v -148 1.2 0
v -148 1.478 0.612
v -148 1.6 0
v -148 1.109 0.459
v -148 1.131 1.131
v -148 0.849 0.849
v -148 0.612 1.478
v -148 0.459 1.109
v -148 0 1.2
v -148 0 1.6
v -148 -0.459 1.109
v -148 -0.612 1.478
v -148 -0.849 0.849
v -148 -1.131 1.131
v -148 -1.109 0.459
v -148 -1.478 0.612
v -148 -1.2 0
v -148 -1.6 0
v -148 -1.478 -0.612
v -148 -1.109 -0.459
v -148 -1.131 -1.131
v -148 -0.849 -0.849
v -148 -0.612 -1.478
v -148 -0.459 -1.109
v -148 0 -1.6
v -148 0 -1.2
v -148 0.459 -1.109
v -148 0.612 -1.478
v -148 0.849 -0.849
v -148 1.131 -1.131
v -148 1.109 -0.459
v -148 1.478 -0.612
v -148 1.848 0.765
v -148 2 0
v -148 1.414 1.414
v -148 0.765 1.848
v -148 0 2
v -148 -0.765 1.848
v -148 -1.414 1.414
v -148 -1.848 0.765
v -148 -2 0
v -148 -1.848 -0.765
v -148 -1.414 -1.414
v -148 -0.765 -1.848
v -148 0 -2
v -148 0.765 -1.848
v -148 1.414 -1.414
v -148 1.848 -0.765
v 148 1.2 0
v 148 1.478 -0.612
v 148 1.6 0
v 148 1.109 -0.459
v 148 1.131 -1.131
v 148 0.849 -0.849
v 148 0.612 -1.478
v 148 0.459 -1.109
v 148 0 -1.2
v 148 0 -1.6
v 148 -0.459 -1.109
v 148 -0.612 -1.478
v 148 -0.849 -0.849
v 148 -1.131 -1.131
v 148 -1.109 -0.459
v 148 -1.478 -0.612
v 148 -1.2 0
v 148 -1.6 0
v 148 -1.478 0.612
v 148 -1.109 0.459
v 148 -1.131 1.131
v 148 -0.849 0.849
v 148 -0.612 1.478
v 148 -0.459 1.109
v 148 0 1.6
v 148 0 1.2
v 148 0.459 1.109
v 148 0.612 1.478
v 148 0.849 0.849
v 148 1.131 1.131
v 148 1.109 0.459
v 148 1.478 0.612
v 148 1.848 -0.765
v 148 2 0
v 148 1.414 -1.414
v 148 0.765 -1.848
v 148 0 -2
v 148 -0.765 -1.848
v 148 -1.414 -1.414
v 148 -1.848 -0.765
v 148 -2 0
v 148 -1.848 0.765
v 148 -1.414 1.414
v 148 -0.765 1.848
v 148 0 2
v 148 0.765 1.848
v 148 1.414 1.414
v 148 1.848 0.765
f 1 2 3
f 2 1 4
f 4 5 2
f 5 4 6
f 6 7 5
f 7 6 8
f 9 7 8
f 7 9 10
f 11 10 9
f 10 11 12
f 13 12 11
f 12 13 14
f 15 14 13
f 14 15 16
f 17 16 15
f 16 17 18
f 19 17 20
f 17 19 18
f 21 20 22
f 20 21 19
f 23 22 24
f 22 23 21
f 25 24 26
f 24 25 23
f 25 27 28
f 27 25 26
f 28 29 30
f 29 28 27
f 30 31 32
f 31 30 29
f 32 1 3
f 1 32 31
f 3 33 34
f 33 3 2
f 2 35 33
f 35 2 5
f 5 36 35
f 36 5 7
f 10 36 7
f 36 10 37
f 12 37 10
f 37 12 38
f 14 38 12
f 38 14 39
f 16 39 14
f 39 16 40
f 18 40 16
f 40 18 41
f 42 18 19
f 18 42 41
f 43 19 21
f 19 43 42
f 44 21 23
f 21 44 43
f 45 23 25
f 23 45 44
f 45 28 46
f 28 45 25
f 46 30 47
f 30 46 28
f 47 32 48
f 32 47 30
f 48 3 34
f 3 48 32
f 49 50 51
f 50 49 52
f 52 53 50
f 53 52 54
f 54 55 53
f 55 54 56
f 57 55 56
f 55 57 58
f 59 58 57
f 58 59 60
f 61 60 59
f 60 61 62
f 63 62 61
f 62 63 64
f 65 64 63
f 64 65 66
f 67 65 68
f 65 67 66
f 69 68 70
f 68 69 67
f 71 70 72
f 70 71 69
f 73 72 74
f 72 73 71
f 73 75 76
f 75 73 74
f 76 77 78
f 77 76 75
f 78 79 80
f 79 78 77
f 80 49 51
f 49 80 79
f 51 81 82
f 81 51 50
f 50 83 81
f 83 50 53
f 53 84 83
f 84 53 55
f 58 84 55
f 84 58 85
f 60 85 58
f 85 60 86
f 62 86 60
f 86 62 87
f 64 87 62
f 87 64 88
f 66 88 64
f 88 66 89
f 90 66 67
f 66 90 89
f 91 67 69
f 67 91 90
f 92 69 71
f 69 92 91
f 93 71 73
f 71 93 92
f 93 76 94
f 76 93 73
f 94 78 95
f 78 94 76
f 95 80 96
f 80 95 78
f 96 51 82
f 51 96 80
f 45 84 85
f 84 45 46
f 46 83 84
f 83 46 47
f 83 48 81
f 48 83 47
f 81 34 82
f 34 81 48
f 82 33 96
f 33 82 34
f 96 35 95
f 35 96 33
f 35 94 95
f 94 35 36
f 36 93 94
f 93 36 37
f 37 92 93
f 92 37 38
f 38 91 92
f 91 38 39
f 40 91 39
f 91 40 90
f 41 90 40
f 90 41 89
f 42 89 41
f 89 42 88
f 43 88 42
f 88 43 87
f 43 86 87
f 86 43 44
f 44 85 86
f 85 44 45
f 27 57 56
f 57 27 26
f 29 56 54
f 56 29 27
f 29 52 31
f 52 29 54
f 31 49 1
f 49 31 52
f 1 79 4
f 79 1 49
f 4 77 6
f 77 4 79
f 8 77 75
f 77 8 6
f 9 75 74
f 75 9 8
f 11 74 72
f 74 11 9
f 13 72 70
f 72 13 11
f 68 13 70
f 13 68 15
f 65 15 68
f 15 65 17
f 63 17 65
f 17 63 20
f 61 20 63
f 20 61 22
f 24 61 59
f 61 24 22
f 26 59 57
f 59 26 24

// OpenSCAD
// file: ../p/4-4cyli.scad
use <../lib.scad>
function ldraw_lib__4_4cyli() = [
// 0 Cylinder 1.0
// 0 Name: 4-4cyli.dat
// 0 Author: James Jessiman
// 0 !LDRAW_ORG Primitive UPDATE 2005-01
// 0 !LICENSE Licensed under CC BY 4.0 : see CAreadme.txt
// 
// 0 BFC CERTIFY CCW
  [0,"BFC","CERTIFY"],
  [0,"BFC","CCW"],
// 
// 0 !HISTORY 1998-12-15 [PTadmin] Official Update 1998-10
// 0 !HISTORY 2002-03-23 [sbliss] Added BFC statement; merged headers from files in distributions LDraw 0.27 and Complete.
// 0 !HISTORY 2002-04-25 [PTadmin] Official Update 2002-02
// 0 !HISTORY 2004-12-14 [guyvivan] BFC CCW
// 0 !HISTORY 2005-12-28 [PTadmin] Official Update 2005-01
// 0 !HISTORY 2007-06-24 [PTadmin] Header formatted for Contributor Agreement
// 0 !HISTORY 2008-07-01 [PTadmin] Official Update 2008-01
// 
// 
// 4 16 1 1 0 0.9239 1 0.3827 0.9239 0 0.3827 1 0 0
  [4,16,1,1,0,0.9239,1,0.3827,0.9239,0,0.3827,1,0,0],
// 5 24 1 0 0 1 1 0 0.9239 0 0.3827 0.9239 0 -0.3827
  [5,24,1,0,0,1,1,0,0.9239,0,0.3827,0.9239,0,-0.3827],
// 4 16 0.9239 1 0.3827 0.7071 1 0.7071 0.7071 0 0.7071 0.9239 0 0.3827
  [4,16,0.9239,1,0.3827,0.7071,1,0.7071,0.7071,0,0.7071,0.9239,0,0.3827],
// 5 24 0.9239 0 0.3827 0.9239 1 0.3827 0.7071 0 0.7071 1 0 0
  [5,24,0.9239,0,0.3827,0.9239,1,0.3827,0.7071,0,0.7071,1,0,0],
// 4 16 0.7071 1 0.7071 0.3827 1 0.9239 0.3827 0 0.9239 0.7071 0 0.7071
  [4,16,0.7071,1,0.7071,0.3827,1,0.9239,0.3827,0,0.9239,0.7071,0,0.7071],
// 5 24 0.7071 0 0.7071 0.7071 1 0.7071 0.3827 0 0.9239 0.9239 0 0.3827
  [5,24,0.7071,0,0.7071,0.7071,1,0.7071,0.3827,0,0.9239,0.9239,0,0.3827],
// 4 16 0.3827 1 0.9239 0 1 1 0 0 1 0.3827 0 0.9239
  [4,16,0.3827,1,0.9239,0,1,1,0,0,1,0.3827,0,0.9239],
// 5 24 0.3827 0 0.9239 0.3827 1 0.9239 0 0 1 0.7071 0 0.7071
  [5,24,0.3827,0,0.9239,0.3827,1,0.9239,0,0,1,0.7071,0,0.7071],
// 4 16 0 1 1 -0.3827 1 0.9239 -0.3827 0 0.9239 0 0 1
  [4,16,0,1,1,-0.3827,1,0.9239,-0.3827,0,0.9239,0,0,1],
// 5 24 0 0 1 0 1 1 -0.3827 0 0.9239 0.3827 0 0.9239
  [5,24,0,0,1,0,1,1,-0.3827,0,0.9239,0.3827,0,0.9239],
// 4 16 -0.3827 1 0.9239 -0.7071 1 0.7071 -0.7071 0 0.7071 -0.3827 0 0.9239
  [4,16,-0.3827,1,0.9239,-0.7071,1,0.7071,-0.7071,0,0.7071,-0.3827,0,0.9239],
// 5 24 -0.3827 0 0.9239 -0.3827 1 0.9239 -0.7071 0 0.7071 0 0 1
  [5,24,-0.3827,0,0.9239,-0.3827,1,0.9239,-0.7071,0,0.7071,0,0,1],
// 4 16 -0.7071 1 0.7071 -0.9239 1 0.3827 -0.9239 0 0.3827 -0.7071 0 0.7071
  [4,16,-0.7071,1,0.7071,-0.9239,1,0.3827,-0.9239,0,0.3827,-0.7071,0,0.7071],
// 5 24 -0.7071 0 0.7071 -0.7071 1 0.7071 -0.9239 0 0.3827 -0.3827 0 0.9239
  [5,24,-0.7071,0,0.7071,-0.7071,1,0.7071,-0.9239,0,0.3827,-0.3827,0,0.9239],
// 4 16 -0.9239 1 0.3827 -1 1 0 -1 0 0 -0.9239 0 0.3827
  [4,16,-0.9239,1,0.3827,-1,1,0,-1,0,0,-0.9239,0,0.3827],
// 5 24 -0.9239 0 0.3827 -0.9239 1 0.3827 -1 0 0 -0.7071 0 0.7071
  [5,24,-0.9239,0,0.3827,-0.9239,1,0.3827,-1,0,0,-0.7071,0,0.7071],
// 4 16 -1 1 0 -0.9239 1 -0.3827 -0.9239 0 -0.3827 -1 0 0
  [4,16,-1,1,0,-0.9239,1,-0.3827,-0.9239,0,-0.3827,-1,0,0],
// 5 24 -1 0 0 -1 1 0 -0.9239 0 -0.3827 -0.9239 0 0.3827
  [5,24,-1,0,0,-1,1,0,-0.9239,0,-0.3827,-0.9239,0,0.3827],
// 4 16 -0.9239 1 -0.3827 -0.7071 1 -0.7071 -0.7071 0 -0.7071 -0.9239 0 -0.3827
  [4,16,-0.9239,1,-0.3827,-0.7071,1,-0.7071,-0.7071,0,-0.7071,-0.9239,0,-0.3827],
// 5 24 -0.9239 0 -0.3827 -0.9239 1 -0.3827 -0.7071 0 -0.7071 -1 0 0
  [5,24,-0.9239,0,-0.3827,-0.9239,1,-0.3827,-0.7071,0,-0.7071,-1,0,0],
// 4 16 -0.7071 1 -0.7071 -0.3827 1 -0.9239 -0.3827 0 -0.9239 -0.7071 0 -0.7071
  [4,16,-0.7071,1,-0.7071,-0.3827,1,-0.9239,-0.3827,0,-0.9239,-0.7071,0,-0.7071],
// 5 24 -0.7071 0 -0.7071 -0.7071 1 -0.7071 -0.3827 0 -0.9239 -0.9239 0 -0.3827
  [5,24,-0.7071,0,-0.7071,-0.7071,1,-0.7071,-0.3827,0,-0.9239,-0.9239,0,-0.3827],
// 4 16 -0.3827 1 -0.9239 0 1 -1 0 0 -1 -0.3827 0 -0.9239
  [4,16,-0.3827,1,-0.9239,0,1,-1,0,0,-1,-0.3827,0,-0.9239],
// 5 24 -0.3827 0 -0.9239 -0.3827 1 -0.9239 0 0 -1 -0.7071 0 -0.7071
  [5,24,-0.3827,0,-0.9239,-0.3827,1,-0.9239,0,0,-1,-0.7071,0,-0.7071],
// 4 16 0 1 -1 0.3827 1 -0.9239 0.3827 0 -0.9239 0 0 -1
  [4,16,0,1,-1,0.3827,1,-0.9239,0.3827,0,-0.9239,0,0,-1],
// 5 24 0 0 -1 0 1 -1 0.3827 0 -0.9239 -0.3827 0 -0.9239
  [5,24,0,0,-1,0,1,-1,0.3827,0,-0.9239,-0.3827,0,-0.9239],
// 4 16 0.3827 1 -0.9239 0.7071 1 -0.7071 0.7071 0 -0.7071 0.3827 0 -0.9239
  [4,16,0.3827,1,-0.9239,0.7071,1,-0.7071,0.7071,0,-0.7071,0.3827,0,-0.9239],
// 5 24 0.3827 0 -0.9239 0.3827 1 -0.9239 0.7071 0 -0.7071 0 0 -1
  [5,24,0.3827,0,-0.9239,0.3827,1,-0.9239,0.7071,0,-0.7071,0,0,-1],
// 4 16 0.7071 1 -0.7071 0.9239 1 -0.3827 0.9239 0 -0.3827 0.7071 0 -0.7071
  [4,16,0.7071,1,-0.7071,0.9239,1,-0.3827,0.9239,0,-0.3827,0.7071,0,-0.7071],
// 5 24 0.7071 0 -0.7071 0.7071 1 -0.7071 0.9239 0 -0.3827 0.3827 0 -0.9239
  [5,24,0.7071,0,-0.7071,0.7071,1,-0.7071,0.9239,0,-0.3827,0.3827,0,-0.9239],
// 4 16 0.9239 1 -0.3827 1 1 0 1 0 0 0.9239 0 -0.3827
  [4,16,0.9239,1,-0.3827,1,1,0,1,0,0,0.9239,0,-0.3827],
// 5 24 0.9239 0 -0.3827 0.9239 1 -0.3827 1 0 0 0.7071 0 -0.7071
  [5,24,0.9239,0,-0.3827,0.9239,1,-0.3827,1,0,0,0.7071,0,-0.7071],
// 0
];
module ldraw_lib__4_4cyli(step=0, col=false, unit=2/5, alt=false, line=0.2, solid=!$preview)
    makepoly(ldraw_lib__4_4cyli(), step=step, col=col, unit=unit, alt=alt, line=line, solid=solid);
ldraw_lib__4_4cyli(line=0.2);
// file: ../p/4-4ring4.scad
use <../lib.scad>
function ldraw_lib__4_4ring4() = [
// 0 Ring  4 x 1.0
// 0 Name: 4-4ring4.dat
// 0 Author: James Jessiman
// 0 !LDRAW_ORG Primitive UPDATE 2009-01
// 0 !LICENSE Licensed under CC BY 4.0 : see CAreadme.txt
// 
// 0 BFC CERTIFY CCW
  [0,"BFC","CERTIFY"],
  [0,"BFC","CCW"],
// 
// 0 !HISTORY 1998-12-15 [PTadmin] Official Update 1998-10
// 0 !HISTORY 2002-04-08 [BrickCaster] Modified for BFC compliance
// 0 !HISTORY 2002-04-25 [PTadmin] Official Update 2002-02
// 0 !HISTORY 2007-06-24 [PTadmin] Header formatted for Contributor Agreement
// 0 !HISTORY 2008-07-01 [PTadmin] Official Update 2008-01
// 0 !HISTORY 2008-08-26 [cwdee] Switch polygon winding and rename
// 0 !HISTORY 2009-05-02 [PTadmin] Official Update 2009-01
// 
// 
// 4 16 -1.9135 0 4.6195 -1.5308 0 3.6956 0 0 4 0 0 5
  [4,16,-1.9135,0,4.6195,-1.5308,0,3.6956,0,0,4,0,0,5],
// 4 16 -3.5355 0 3.5355 -2.8284 0 2.8284 -1.5308 0 3.6956 -1.9135 0 4.6195
  [4,16,-3.5355,0,3.5355,-2.8284,0,2.8284,-1.5308,0,3.6956,-1.9135,0,4.6195],
// 4 16 -4.6195 0 1.9135 -3.6956 0 1.5308 -2.8284 0 2.8284 -3.5355 0 3.5355
  [4,16,-4.6195,0,1.9135,-3.6956,0,1.5308,-2.8284,0,2.8284,-3.5355,0,3.5355],
// 4 16 -5 0 0 -4 0 0 -3.6956 0 1.5308 -4.6195 0 1.9135
  [4,16,-5,0,0,-4,0,0,-3.6956,0,1.5308,-4.6195,0,1.9135],
// 4 16 -4.6195 0 -1.9135 -3.6956 0 -1.5308 -4 0 0 -5 0 0
  [4,16,-4.6195,0,-1.9135,-3.6956,0,-1.5308,-4,0,0,-5,0,0],
// 4 16 -3.5355 0 -3.5355 -2.8284 0 -2.8284 -3.6956 0 -1.5308 -4.6195 0 -1.9135
  [4,16,-3.5355,0,-3.5355,-2.8284,0,-2.8284,-3.6956,0,-1.5308,-4.6195,0,-1.9135],
// 4 16 -1.9135 0 -4.6195 -1.5308 0 -3.6956 -2.8284 0 -2.8284 -3.5355 0 -3.5355
  [4,16,-1.9135,0,-4.6195,-1.5308,0,-3.6956,-2.8284,0,-2.8284,-3.5355,0,-3.5355],
// 4 16 0 0 -5 0 0 -4 -1.5308 0 -3.6956 -1.9135 0 -4.6195
  [4,16,0,0,-5,0,0,-4,-1.5308,0,-3.6956,-1.9135,0,-4.6195],
// 4 16 1.9135 0 -4.6195 1.5308 0 -3.6956 0 0 -4 0 0 -5
  [4,16,1.9135,0,-4.6195,1.5308,0,-3.6956,0,0,-4,0,0,-5],
// 4 16 3.5355 0 -3.5355 2.8284 0 -2.8284 1.5308 0 -3.6956 1.9135 0 -4.6195
  [4,16,3.5355,0,-3.5355,2.8284,0,-2.8284,1.5308,0,-3.6956,1.9135,0,-4.6195],
// 4 16 4.6195 0 -1.9135 3.6956 0 -1.5308 2.8284 0 -2.8284 3.5355 0 -3.5355
  [4,16,4.6195,0,-1.9135,3.6956,0,-1.5308,2.8284,0,-2.8284,3.5355,0,-3.5355],
// 4 16 5 0 0 4 0 0 3.6956 0 -1.5308 4.6195 0 -1.9135
  [4,16,5,0,0,4,0,0,3.6956,0,-1.5308,4.6195,0,-1.9135],
// 4 16 4.6195 0 1.9135 3.6956 0 1.5308 4 0 0 5 0 0
  [4,16,4.6195,0,1.9135,3.6956,0,1.5308,4,0,0,5,0,0],
// 4 16 3.5355 0 3.5355 2.8284 0 2.8284 3.6956 0 1.5308 4.6195 0 1.9135
  [4,16,3.5355,0,3.5355,2.8284,0,2.8284,3.6956,0,1.5308,4.6195,0,1.9135],
// 4 16 1.9135 0 4.6195 1.5308 0 3.6956 2.8284 0 2.8284 3.5355 0 3.5355
  [4,16,1.9135,0,4.6195,1.5308,0,3.6956,2.8284,0,2.8284,3.5355,0,3.5355],
// 4 16 0 0 5 0 0 4 1.5308 0 3.6956 1.9135 0 4.6195
  [4,16,0,0,5,0,0,4,1.5308,0,3.6956,1.9135,0,4.6195],
// 0
];
module ldraw_lib__4_4ring4(step=0, col=false, unit=2/5, alt=false, line=0.2, solid=!$preview)
    makepoly(ldraw_lib__4_4ring4(), step=step, col=col, unit=unit, alt=alt, line=line, solid=solid);
ldraw_lib__4_4ring4(line=0.2);
// file: ../p/4-4ring3.scad
use <../lib.scad>
function ldraw_lib__4_4ring3() = [
// 0 Ring  3 x 1.0
// 0 Name: 4-4ring3.dat
// 0 Author: James Jessiman
// 0 !LDRAW_ORG Primitive UPDATE 2009-01
// 0 !LICENSE Licensed under CC BY 4.0 : see CAreadme.txt
// 
// 0 BFC CERTIFY CCW
  [0,"BFC","CERTIFY"],
  [0,"BFC","CCW"],
// 
// 0 !HISTORY 1998-12-15 [PTadmin] Official Update 1998-10
// 0 !HISTORY 2002-04-05 [hafhead] Added BFC statement
// 0 !HISTORY 2002-04-25 [PTadmin] Official Update 2002-02
// 0 !HISTORY 2007-06-24 [PTadmin] Header formatted for Contributor Agreement
// 0 !HISTORY 2008-07-01 [PTadmin] Official Update 2008-01
// 0 !HISTORY 2008-08-26 [cwdee] Switch polygon winding and rename
// 0 !HISTORY 2009-05-02 [PTadmin] Official Update 2009-01
// 
// 
// 4 16 -1.5308 0 3.6956 -1.1481 0 2.7717 0 0 3 0 0 4
  [4,16,-1.5308,0,3.6956,-1.1481,0,2.7717,0,0,3,0,0,4],
// 4 16 -2.8284 0 2.8284 -2.1213 0 2.1213 -1.1481 0 2.7717 -1.5308 0 3.6956
  [4,16,-2.8284,0,2.8284,-2.1213,0,2.1213,-1.1481,0,2.7717,-1.5308,0,3.6956],
// 4 16 -3.6956 0 1.5308 -2.7717 0 1.1481 -2.1213 0 2.1213 -2.8284 0 2.8284
  [4,16,-3.6956,0,1.5308,-2.7717,0,1.1481,-2.1213,0,2.1213,-2.8284,0,2.8284],
// 4 16 -4 0 0 -3 0 0 -2.7717 0 1.1481 -3.6956 0 1.5308
  [4,16,-4,0,0,-3,0,0,-2.7717,0,1.1481,-3.6956,0,1.5308],
// 4 16 -3.6956 0 -1.5308 -2.7717 0 -1.1481 -3 0 0 -4 0 0
  [4,16,-3.6956,0,-1.5308,-2.7717,0,-1.1481,-3,0,0,-4,0,0],
// 4 16 -2.8284 0 -2.8284 -2.1213 0 -2.1213 -2.7717 0 -1.1481 -3.6956 0 -1.5308
  [4,16,-2.8284,0,-2.8284,-2.1213,0,-2.1213,-2.7717,0,-1.1481,-3.6956,0,-1.5308],
// 4 16 -1.5308 0 -3.6956 -1.1481 0 -2.7717 -2.1213 0 -2.1213 -2.8284 0 -2.8284
  [4,16,-1.5308,0,-3.6956,-1.1481,0,-2.7717,-2.1213,0,-2.1213,-2.8284,0,-2.8284],
// 4 16 0 0 -4 0 0 -3 -1.1481 0 -2.7717 -1.5308 0 -3.6956
  [4,16,0,0,-4,0,0,-3,-1.1481,0,-2.7717,-1.5308,0,-3.6956],
// 4 16 1.5308 0 -3.6956 1.1481 0 -2.7717 0 0 -3 0 0 -4
  [4,16,1.5308,0,-3.6956,1.1481,0,-2.7717,0,0,-3,0,0,-4],
// 4 16 2.8284 0 -2.8284 2.1213 0 -2.1213 1.1481 0 -2.7717 1.5308 0 -3.6956
  [4,16,2.8284,0,-2.8284,2.1213,0,-2.1213,1.1481,0,-2.7717,1.5308,0,-3.6956],
// 4 16 3.6956 0 -1.5308 2.7717 0 -1.1481 2.1213 0 -2.1213 2.8284 0 -2.8284
  [4,16,3.6956,0,-1.5308,2.7717,0,-1.1481,2.1213,0,-2.1213,2.8284,0,-2.8284],
// 4 16 4 0 0 3 0 0 2.7717 0 -1.1481 3.6956 0 -1.5308
  [4,16,4,0,0,3,0,0,2.7717,0,-1.1481,3.6956,0,-1.5308],
// 4 16 3.6956 0 1.5308 2.7717 0 1.1481 3 0 0 4 0 0
  [4,16,3.6956,0,1.5308,2.7717,0,1.1481,3,0,0,4,0,0],
// 4 16 2.8284 0 2.8284 2.1213 0 2.1213 2.7717 0 1.1481 3.6956 0 1.5308
  [4,16,2.8284,0,2.8284,2.1213,0,2.1213,2.7717,0,1.1481,3.6956,0,1.5308],
// 4 16 1.5308 0 3.6956 1.1481 0 2.7717 2.1213 0 2.1213 2.8284 0 2.8284
  [4,16,1.5308,0,3.6956,1.1481,0,2.7717,2.1213,0,2.1213,2.8284,0,2.8284],
// 4 16 0 0 4 0 0 3 1.1481 0 2.7717 1.5308 0 3.6956
  [4,16,0,0,4,0,0,3,1.1481,0,2.7717,1.5308,0,3.6956],
// 0
];
module ldraw_lib__4_4ring3(step=0, col=false, unit=2/5, alt=false, line=0.2, solid=!$preview)
    makepoly(ldraw_lib__4_4ring3(), step=step, col=col, unit=unit, alt=alt, line=line, solid=solid);
ldraw_lib__4_4ring3(line=0.2);
// file: ../p/4-4edge.scad
use <../lib.scad>
function ldraw_lib__4_4edge() = [
// 0 Circle 1.0
// 0 Name: 4-4edge.dat
// 0 Author: James Jessiman
// 0 !LDRAW_ORG Primitive UPDATE 2017-01
// 0 !LICENSE Licensed under CC BY 4.0 : see CAreadme.txt
// 
// 0 BFC CERTIFY CCW
  [0,"BFC","CERTIFY"],
  [0,"BFC","CCW"],
// 
// 0 !HISTORY 1998-12-15 [PTadmin] Official Update 1998-10
// 0 !HISTORY 2005-12-28 [PTadmin] Official Update 2005-01
// 0 !HISTORY 2007-06-24 [PTadmin] Header formatted for Contributor Agreement
// 0 !HISTORY 2008-07-01 [PTadmin] Official Update 2008-01
// 0 !HISTORY 2017-01-15 [Steffen] BFCed
// 0 !HISTORY 2017-12-30 [PTadmin] Official Update 2017-01
// 
// 
// 2 24 1 0 0 0.9239 0 0.3827
  [2,24,1,0,0,0.9239,0,0.3827],
// 2 24 0.9239 0 0.3827 0.7071 0 0.7071
  [2,24,0.9239,0,0.3827,0.7071,0,0.7071],
// 2 24 0.7071 0 0.7071 0.3827 0 0.9239
  [2,24,0.7071,0,0.7071,0.3827,0,0.9239],
// 2 24 0.3827 0 0.9239 0 0 1
  [2,24,0.3827,0,0.9239,0,0,1],
// 2 24 0 0 1 -0.3827 0 0.9239
  [2,24,0,0,1,-0.3827,0,0.9239],
// 2 24 -0.3827 0 0.9239 -0.7071 0 0.7071
  [2,24,-0.3827,0,0.9239,-0.7071,0,0.7071],
// 2 24 -0.7071 0 0.7071 -0.9239 0 0.3827
  [2,24,-0.7071,0,0.7071,-0.9239,0,0.3827],
// 2 24 -0.9239 0 0.3827 -1 0 -0
  [2,24,-0.9239,0,0.3827,-1,0,-0],
// 2 24 -1 0 -0 -0.9239 0 -0.3827
  [2,24,-1,0,-0,-0.9239,0,-0.3827],
// 2 24 -0.9239 0 -0.3827 -0.7071 0 -0.7071
  [2,24,-0.9239,0,-0.3827,-0.7071,0,-0.7071],
// 2 24 -0.7071 0 -0.7071 -0.3827 0 -0.9239
  [2,24,-0.7071,0,-0.7071,-0.3827,0,-0.9239],
// 2 24 -0.3827 0 -0.9239 0 0 -1
  [2,24,-0.3827,0,-0.9239,0,0,-1],
// 2 24 0 0 -1 0.3827 0 -0.9239
  [2,24,0,0,-1,0.3827,0,-0.9239],
// 2 24 0.3827 0 -0.9239 0.7071 0 -0.7071
  [2,24,0.3827,0,-0.9239,0.7071,0,-0.7071],
// 2 24 0.7071 0 -0.7071 0.9239 0 -0.3827
  [2,24,0.7071,0,-0.7071,0.9239,0,-0.3827],
// 2 24 0.9239 0 -0.3827 1 0 0
  [2,24,0.9239,0,-0.3827,1,0,0],
];
module ldraw_lib__4_4edge(step=0, col=false, unit=2/5, alt=false, line=0.2, solid=!$preview)
    makepoly(ldraw_lib__4_4edge(), step=step, col=col, unit=unit, alt=alt, line=line, solid=solid);
ldraw_lib__4_4edge(line=0.2);
// file: 71533k03.scad
use <../lib.scad>
use <../p/4-4cyli.scad>
function ldraw_lib__71533k03() = [
// 0 ~Technic Pneumatic Tube Segment
// 0 Name: 71533k03.dat
// 0 Author: Jaco van der Molen [Jaco]
// 0 !LDRAW_ORG Part Flexible_Section UPDATE 2020-01
// 0 !LICENSE Licensed under CC BY 4.0 : see CAreadme.txt
// 
// 0 BFC CERTIFY CW
  [0,"BFC","CERTIFY"],
  [0,"BFC","CW"],
// 
// 0 !HISTORY 2003-11-30 [Steffen] BFCed
// 0 !HISTORY 2009-12-29 [PTadmin] Official Update 2009-03
// 0 !HISTORY 2020-06-27 [PTadmin] Renamed from 166
// 0 !HISTORY 2020-06-28 [PTadmin] Official Update 2020-01
// 
// 
// 1 16 0 0 0 5 0 0 0 1 0 0 0 5 4-4cyli.dat
  [1,16,0,0,0,5,0,0,0,1,0,0,0,5, ldraw_lib__4_4cyli()],
// 0 BFC INVERTNEXT
  [0,"BFC","INVERTNEXT"],
// 1 16 0 0 0 3 0 0 0 1 0 0 0 3 4-4cyli.dat
  [1,16,0,0,0,3,0,0,0,1,0,0,0,3, ldraw_lib__4_4cyli()],
// 0
];
module ldraw_lib__71533k03(step=0, col=false, unit=2/5, alt=false, line=0.2, solid=!$preview)
    makepoly(ldraw_lib__71533k03(), step=step, col=col, unit=unit, alt=alt, line=line, solid=solid);
ldraw_lib__71533k03(line=0.2);
// file: 71533k02.scad
use <../lib.scad>
use <../p/4-4edge.scad>
use <../p/4-4ring3.scad>
use <../p/4-4ring4.scad>
function ldraw_lib__71533k02() = [
// 0 ~Technic Pneumatic Tube End (Non-Bulged)
// 0 Name: 71533k02.dat
// 0 Author: Steffen [Steffen]
// 0 !LDRAW_ORG Part Flexible_Section UPDATE 2020-01
// 0 !LICENSE Licensed under CC BY 4.0 : see CAreadme.txt
// 
// 0 BFC CERTIFY CCW
  [0,"BFC","CERTIFY"],
  [0,"BFC","CCW"],
// 
// 0 !HISTORY 2020-06-28 [PTadmin] Official Update 2020-01
// 
// 
// 0 // This file goes together with 71533k01.dat and 71533k03.dat.
// 0 // Those 3 files can be used to create Technic Pneumatic Tubes
// 0 // with either bulged or non-bulged ends.
// 
// 1 16 0 0 0 1 0 0 0 1 0 0 0 1 4-4ring3.dat
  [1,16,0,0,0,1,0,0,0,1,0,0,0,1, ldraw_lib__4_4ring3()],
// 1 16 0 0 0 1 0 0 0 1 0 0 0 1 4-4ring4.dat
  [1,16,0,0,0,1,0,0,0,1,0,0,0,1, ldraw_lib__4_4ring4()],
// 1 16 0 0 0 3 0 0 0 3 0 0 0 3 4-4edge.dat
  [1,16,0,0,0,3,0,0,0,3,0,0,0,3, ldraw_lib__4_4edge()],
// 1 16 0 0 0 5 0 0 0 5 0 0 0 5 4-4edge.dat
  [1,16,0,0,0,5,0,0,0,5,0,0,0,5, ldraw_lib__4_4edge()],
];
module ldraw_lib__71533k02(step=0, col=false, unit=2/5, alt=false, line=0.2, solid=!$preview)
    makepoly(ldraw_lib__71533k02(), step=step, col=col, unit=unit, alt=alt, line=line, solid=solid);
ldraw_lib__71533k02(line=0.2);
// main file
use <../lib.scad>
use <71533k02.scad>
use <71533k03.scad>
function ldraw_lib__21835_f1() = [
// 0 Technic Pneumatic Tube 37L
// 0 Name: 21835-f1.dat
// 0 Author: Philippe Hurbain [Philo]
// 0 !LDRAW_ORG Part UPDATE 2020-02
// 0 !LICENSE Licensed under CC BY 4.0 : see CAreadme.txt
// 
// 0 BFC CERTIFY CCW
  [0,"BFC","CERTIFY"],
  [0,"BFC","CCW"],
// 
// 0 !KEYWORDS 296 mm, BrickLink 21835, Rebrickable 5102c37
// 
// 0 !HISTORY 2020-09-05 [PTadmin] Official Update 2020-02
// 
// 
// 1 16 -370 0 0 0 1 0 1 0 0 0 0 1 71533k02.dat
  [1,16,-370,0,0,0,1,0,1,0,0,0,0,1, ldraw_lib__71533k02()],
// 1 16 370 0 0 0 -1 0 -1 0 0 0 0 1 71533k02.dat
  [1,16,370,0,0,0,-1,0,-1,0,0,0,0,1, ldraw_lib__71533k02()],
// 1 16 -370 0 0 0 740 0 1 0 0 0 0 1 71533k03.dat
  [1,16,-370,0,0,0,740,0,1,0,0,0,0,1, ldraw_lib__71533k03()],
];
module ldraw_lib__21835_f1(step=0, col=false, unit=2/5, alt=false, line=0.2, solid=!$preview)
    makepoly(ldraw_lib__21835_f1(), step=step, col=col, unit=unit, alt=alt, line=line, solid=solid);
ldraw_lib__21835_f1(line=0.2);
